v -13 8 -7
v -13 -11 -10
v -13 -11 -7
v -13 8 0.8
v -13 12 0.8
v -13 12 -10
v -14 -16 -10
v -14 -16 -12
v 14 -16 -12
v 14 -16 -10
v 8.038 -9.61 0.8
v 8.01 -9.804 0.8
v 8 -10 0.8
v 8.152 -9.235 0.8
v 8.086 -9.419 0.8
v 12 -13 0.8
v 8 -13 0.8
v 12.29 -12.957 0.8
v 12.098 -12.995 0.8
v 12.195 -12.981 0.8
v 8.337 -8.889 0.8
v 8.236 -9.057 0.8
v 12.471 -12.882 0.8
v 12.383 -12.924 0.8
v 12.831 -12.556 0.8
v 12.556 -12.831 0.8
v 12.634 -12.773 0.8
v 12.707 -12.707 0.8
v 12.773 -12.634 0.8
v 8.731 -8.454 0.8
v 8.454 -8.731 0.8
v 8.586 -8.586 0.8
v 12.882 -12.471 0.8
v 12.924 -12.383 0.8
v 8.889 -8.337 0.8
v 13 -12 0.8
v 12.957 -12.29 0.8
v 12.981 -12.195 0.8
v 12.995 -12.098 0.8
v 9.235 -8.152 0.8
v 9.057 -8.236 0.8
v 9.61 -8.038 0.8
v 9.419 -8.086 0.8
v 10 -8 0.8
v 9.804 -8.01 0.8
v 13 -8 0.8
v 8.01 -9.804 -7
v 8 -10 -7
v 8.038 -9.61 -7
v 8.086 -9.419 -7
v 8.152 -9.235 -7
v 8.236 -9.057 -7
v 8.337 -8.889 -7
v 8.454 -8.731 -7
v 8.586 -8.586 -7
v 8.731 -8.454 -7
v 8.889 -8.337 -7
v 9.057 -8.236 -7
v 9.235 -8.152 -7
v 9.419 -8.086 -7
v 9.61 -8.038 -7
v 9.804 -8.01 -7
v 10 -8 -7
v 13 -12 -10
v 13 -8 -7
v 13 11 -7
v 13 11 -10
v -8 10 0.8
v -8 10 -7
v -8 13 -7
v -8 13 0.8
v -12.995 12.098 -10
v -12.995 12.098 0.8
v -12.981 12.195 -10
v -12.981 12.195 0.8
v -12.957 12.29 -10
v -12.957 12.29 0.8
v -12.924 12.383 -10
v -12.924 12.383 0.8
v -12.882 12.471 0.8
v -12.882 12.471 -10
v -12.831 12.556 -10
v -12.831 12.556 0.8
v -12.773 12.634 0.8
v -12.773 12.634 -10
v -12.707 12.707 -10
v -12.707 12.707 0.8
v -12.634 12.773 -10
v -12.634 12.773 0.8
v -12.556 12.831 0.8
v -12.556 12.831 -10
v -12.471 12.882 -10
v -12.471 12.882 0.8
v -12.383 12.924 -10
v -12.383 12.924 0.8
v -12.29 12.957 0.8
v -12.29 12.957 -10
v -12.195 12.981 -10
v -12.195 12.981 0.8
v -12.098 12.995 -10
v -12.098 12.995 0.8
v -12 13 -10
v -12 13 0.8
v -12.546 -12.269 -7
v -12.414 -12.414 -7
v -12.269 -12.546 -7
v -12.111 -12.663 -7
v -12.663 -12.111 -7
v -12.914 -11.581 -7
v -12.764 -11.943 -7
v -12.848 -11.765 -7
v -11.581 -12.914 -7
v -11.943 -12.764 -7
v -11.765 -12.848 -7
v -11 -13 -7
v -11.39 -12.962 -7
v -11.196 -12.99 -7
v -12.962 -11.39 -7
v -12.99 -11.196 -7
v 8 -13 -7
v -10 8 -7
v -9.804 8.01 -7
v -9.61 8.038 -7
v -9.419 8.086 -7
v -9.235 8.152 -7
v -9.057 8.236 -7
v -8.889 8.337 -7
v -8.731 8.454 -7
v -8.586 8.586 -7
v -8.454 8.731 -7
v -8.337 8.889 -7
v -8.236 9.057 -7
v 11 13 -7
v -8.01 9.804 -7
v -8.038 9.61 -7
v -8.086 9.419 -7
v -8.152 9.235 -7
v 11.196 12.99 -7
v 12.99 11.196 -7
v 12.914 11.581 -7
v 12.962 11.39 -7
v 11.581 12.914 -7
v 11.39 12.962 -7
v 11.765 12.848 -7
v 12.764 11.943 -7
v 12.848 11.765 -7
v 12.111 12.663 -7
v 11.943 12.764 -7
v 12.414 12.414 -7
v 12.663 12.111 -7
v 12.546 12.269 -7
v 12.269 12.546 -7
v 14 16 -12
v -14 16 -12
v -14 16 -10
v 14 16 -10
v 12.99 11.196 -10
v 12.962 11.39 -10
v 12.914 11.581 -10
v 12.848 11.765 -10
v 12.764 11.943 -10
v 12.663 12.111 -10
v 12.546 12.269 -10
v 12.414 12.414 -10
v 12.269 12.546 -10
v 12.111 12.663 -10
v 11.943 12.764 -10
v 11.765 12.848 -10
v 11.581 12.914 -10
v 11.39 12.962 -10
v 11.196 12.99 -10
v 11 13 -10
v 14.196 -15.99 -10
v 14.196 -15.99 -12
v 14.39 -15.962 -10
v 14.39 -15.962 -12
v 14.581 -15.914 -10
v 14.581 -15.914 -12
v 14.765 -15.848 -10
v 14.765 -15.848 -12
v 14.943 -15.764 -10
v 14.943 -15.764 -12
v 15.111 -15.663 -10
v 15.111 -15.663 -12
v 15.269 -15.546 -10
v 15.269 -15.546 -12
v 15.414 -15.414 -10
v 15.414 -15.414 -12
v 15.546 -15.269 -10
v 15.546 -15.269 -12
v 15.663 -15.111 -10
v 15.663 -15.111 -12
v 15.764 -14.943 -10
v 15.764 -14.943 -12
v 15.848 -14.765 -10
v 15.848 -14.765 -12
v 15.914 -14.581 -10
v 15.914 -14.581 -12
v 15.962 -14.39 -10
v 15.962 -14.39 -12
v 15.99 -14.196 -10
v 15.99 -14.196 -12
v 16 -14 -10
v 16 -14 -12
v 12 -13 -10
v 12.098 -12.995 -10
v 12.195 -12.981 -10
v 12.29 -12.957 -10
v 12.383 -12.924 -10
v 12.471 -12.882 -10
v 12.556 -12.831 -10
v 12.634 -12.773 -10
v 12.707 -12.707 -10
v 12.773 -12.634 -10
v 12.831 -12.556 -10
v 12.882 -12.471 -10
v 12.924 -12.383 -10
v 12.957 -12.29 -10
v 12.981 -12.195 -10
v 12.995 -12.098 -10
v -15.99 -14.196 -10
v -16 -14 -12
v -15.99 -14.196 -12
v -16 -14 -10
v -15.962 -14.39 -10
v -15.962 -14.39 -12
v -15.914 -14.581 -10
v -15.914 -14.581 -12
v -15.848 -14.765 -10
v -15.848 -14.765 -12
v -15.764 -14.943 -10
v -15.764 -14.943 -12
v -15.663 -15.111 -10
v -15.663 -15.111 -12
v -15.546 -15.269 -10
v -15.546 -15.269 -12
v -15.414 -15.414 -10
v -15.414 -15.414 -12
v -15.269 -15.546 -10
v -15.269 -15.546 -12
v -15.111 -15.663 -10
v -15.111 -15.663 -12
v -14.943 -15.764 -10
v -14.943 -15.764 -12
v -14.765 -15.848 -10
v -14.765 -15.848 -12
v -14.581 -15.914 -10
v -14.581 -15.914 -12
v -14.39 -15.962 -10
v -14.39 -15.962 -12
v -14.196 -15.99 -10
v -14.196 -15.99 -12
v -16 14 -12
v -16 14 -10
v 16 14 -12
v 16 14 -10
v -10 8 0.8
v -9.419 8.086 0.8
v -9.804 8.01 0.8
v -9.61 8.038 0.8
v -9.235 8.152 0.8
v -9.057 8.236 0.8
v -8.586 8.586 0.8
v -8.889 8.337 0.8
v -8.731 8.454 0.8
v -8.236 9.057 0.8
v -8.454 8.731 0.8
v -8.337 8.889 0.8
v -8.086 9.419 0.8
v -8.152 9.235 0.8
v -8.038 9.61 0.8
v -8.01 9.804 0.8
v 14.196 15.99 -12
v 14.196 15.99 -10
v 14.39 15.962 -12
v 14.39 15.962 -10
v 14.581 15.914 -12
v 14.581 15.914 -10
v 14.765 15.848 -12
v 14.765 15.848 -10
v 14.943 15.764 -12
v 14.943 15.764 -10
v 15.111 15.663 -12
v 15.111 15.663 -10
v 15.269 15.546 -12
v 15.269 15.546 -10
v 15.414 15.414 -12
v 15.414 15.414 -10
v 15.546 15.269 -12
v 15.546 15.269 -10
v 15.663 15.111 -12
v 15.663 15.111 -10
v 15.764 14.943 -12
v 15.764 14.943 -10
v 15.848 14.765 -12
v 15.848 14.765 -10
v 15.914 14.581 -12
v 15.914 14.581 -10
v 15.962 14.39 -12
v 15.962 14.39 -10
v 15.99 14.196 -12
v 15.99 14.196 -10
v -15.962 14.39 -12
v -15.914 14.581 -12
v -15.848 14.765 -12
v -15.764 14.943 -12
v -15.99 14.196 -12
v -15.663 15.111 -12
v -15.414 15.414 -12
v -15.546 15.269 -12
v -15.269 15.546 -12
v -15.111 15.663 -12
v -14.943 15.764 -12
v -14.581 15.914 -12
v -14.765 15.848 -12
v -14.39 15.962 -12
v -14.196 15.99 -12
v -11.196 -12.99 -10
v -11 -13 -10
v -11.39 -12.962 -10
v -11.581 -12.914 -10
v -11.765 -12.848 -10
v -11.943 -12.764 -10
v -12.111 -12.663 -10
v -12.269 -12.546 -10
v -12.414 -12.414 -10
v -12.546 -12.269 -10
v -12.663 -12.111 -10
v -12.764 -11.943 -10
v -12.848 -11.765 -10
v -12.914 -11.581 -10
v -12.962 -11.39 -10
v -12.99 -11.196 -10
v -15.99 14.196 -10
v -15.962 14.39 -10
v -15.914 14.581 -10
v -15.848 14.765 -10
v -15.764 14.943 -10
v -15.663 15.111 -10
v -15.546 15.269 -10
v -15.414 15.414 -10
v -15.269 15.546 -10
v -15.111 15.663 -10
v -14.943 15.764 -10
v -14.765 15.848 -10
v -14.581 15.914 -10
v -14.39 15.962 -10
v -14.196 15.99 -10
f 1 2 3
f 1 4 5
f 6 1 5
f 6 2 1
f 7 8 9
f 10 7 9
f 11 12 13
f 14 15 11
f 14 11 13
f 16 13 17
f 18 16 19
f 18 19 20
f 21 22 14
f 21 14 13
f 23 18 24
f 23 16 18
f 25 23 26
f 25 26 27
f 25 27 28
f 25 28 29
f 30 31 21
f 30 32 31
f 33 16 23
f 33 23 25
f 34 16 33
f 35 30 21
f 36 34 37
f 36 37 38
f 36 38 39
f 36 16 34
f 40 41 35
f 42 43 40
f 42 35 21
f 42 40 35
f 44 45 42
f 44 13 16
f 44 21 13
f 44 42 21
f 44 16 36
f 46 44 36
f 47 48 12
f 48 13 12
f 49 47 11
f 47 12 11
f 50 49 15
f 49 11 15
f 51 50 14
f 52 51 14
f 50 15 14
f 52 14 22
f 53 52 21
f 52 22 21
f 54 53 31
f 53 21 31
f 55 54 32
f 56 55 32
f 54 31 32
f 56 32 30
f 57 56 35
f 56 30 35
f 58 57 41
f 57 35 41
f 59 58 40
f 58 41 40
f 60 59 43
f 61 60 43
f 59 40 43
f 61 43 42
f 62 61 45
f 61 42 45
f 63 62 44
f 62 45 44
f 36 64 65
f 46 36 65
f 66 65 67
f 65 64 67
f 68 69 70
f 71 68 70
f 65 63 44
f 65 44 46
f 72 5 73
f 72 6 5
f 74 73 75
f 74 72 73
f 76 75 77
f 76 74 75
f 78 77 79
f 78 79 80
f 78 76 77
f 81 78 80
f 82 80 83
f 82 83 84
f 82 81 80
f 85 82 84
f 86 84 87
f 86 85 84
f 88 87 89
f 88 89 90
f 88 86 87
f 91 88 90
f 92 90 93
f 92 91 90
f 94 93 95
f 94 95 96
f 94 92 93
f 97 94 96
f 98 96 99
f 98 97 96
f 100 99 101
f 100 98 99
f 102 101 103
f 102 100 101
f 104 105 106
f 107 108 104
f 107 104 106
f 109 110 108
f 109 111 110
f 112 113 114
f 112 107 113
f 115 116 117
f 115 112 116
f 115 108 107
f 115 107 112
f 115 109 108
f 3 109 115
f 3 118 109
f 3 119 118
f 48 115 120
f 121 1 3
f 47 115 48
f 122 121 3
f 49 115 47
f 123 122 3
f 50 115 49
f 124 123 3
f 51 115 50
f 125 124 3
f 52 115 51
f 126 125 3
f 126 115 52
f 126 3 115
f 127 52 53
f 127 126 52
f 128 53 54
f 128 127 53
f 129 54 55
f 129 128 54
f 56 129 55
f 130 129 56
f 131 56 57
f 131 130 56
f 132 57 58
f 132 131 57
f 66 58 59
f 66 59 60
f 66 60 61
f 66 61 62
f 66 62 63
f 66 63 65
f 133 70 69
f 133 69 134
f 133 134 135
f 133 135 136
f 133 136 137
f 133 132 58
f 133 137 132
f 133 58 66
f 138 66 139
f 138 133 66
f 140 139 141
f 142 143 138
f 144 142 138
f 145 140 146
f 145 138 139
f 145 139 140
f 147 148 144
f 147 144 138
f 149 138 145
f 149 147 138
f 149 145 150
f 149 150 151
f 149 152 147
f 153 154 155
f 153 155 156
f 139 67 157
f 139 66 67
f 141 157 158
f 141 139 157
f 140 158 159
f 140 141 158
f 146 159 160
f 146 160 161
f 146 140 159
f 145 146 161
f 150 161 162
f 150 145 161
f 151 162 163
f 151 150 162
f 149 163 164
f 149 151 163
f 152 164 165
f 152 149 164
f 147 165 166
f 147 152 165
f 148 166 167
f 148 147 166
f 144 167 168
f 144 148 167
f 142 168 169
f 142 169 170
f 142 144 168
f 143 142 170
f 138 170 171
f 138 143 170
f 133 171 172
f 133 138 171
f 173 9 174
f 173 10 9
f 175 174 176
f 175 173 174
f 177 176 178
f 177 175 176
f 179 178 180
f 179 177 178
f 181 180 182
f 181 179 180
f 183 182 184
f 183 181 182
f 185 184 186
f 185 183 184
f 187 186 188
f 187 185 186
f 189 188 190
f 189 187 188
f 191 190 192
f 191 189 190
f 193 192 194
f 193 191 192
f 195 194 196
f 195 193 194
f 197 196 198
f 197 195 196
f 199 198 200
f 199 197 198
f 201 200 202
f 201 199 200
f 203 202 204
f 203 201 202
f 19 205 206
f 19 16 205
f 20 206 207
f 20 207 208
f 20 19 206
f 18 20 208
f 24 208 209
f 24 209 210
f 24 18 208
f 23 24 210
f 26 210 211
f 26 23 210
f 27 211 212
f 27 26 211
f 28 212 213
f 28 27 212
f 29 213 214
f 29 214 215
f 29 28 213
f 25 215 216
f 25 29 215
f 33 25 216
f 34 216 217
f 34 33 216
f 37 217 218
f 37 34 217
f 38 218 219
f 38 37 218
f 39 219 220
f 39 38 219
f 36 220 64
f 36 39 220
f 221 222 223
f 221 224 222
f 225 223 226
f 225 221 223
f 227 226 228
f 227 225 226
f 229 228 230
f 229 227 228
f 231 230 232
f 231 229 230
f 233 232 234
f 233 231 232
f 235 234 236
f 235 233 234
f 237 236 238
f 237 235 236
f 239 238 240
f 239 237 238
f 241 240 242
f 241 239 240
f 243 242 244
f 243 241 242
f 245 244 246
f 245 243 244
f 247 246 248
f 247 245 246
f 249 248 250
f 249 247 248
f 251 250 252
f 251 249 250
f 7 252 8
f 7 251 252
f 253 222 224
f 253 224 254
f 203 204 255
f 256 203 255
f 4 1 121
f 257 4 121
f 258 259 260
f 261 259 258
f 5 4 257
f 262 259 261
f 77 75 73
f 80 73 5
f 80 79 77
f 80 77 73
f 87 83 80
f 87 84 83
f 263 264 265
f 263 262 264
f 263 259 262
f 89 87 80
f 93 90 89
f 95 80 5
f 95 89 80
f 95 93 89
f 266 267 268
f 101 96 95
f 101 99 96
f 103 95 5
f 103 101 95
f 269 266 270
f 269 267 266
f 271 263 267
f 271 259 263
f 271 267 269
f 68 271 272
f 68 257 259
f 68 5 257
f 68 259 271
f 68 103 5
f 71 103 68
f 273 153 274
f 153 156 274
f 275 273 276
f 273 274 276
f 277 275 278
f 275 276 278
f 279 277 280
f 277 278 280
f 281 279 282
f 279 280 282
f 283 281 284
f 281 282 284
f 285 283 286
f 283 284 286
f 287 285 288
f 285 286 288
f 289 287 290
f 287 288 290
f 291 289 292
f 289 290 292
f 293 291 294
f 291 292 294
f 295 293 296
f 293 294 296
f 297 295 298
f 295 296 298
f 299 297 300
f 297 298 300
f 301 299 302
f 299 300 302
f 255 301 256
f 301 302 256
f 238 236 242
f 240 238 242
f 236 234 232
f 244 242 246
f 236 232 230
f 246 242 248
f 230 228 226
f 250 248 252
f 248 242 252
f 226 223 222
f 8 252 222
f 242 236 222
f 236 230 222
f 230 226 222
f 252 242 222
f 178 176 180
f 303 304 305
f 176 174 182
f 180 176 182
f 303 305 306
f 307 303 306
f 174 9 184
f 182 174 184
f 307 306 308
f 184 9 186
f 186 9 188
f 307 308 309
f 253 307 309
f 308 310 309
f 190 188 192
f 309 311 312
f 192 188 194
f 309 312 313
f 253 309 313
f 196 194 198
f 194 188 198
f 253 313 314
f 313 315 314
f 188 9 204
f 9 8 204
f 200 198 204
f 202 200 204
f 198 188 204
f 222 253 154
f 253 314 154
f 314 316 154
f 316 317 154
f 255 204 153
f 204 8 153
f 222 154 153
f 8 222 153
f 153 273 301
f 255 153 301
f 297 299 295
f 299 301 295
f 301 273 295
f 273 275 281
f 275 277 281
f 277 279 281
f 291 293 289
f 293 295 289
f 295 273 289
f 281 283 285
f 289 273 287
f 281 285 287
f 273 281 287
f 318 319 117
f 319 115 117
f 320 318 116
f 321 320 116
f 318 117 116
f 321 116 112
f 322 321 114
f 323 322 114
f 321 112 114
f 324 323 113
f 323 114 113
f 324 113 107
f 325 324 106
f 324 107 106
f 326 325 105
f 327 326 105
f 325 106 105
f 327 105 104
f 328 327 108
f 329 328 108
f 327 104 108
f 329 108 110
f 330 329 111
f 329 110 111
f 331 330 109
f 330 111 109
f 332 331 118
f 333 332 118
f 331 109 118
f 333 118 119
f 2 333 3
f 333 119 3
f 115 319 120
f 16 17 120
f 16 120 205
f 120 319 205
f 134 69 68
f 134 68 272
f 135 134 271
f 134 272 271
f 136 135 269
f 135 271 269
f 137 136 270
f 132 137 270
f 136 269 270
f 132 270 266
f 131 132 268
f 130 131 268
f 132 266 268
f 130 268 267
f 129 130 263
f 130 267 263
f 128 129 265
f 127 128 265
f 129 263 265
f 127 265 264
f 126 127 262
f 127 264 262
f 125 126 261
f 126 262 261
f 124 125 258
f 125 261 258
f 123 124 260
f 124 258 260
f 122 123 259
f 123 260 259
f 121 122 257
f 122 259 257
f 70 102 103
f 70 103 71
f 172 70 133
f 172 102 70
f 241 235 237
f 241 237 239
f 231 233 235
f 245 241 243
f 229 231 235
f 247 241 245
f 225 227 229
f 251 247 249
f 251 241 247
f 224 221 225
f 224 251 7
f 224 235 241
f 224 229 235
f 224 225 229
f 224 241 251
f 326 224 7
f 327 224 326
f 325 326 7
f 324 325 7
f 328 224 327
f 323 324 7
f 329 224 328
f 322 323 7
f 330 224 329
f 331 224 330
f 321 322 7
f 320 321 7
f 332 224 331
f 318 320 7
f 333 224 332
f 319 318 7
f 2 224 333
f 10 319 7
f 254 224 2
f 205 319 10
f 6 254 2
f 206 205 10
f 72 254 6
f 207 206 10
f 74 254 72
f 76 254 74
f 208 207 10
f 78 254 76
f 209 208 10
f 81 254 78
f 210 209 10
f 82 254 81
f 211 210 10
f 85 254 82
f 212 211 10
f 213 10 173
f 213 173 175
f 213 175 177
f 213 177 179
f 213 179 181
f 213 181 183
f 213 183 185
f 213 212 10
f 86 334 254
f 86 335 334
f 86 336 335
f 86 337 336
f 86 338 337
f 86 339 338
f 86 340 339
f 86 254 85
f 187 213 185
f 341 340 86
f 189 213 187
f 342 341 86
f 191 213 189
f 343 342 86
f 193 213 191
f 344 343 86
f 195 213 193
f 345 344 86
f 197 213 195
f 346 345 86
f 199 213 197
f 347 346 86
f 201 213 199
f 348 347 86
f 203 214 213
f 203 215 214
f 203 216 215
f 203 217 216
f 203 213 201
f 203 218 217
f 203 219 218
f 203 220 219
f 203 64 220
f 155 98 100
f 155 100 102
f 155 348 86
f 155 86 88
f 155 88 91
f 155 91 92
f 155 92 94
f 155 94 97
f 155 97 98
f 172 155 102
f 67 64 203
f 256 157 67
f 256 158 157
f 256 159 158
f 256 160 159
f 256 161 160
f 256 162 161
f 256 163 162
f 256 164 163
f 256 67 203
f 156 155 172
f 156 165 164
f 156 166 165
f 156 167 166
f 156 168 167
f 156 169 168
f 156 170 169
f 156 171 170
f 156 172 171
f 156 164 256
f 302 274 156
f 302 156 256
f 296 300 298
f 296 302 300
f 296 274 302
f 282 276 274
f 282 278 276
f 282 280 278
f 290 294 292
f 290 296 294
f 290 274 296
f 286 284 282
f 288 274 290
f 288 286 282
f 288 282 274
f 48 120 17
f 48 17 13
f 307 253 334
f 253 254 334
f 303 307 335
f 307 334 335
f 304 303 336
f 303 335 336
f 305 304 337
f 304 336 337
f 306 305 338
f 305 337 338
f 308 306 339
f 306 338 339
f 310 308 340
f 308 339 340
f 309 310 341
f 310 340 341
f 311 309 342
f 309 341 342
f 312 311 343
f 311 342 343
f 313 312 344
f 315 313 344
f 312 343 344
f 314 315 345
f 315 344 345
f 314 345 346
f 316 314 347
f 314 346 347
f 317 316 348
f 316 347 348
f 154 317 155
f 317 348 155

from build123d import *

# Parameters (mm, degrees)
BOX013_W     = 26
BOX013_H     = 26
BOX013_DEPTH = 3
BOX014_W     = 5
BOX014_H     = 5
BOX014_DEPTH = 7.8
BOX015_W     = 5
BOX015_H     = 5
BOX015_DEPTH = 7.8
BOX012_W     = 32
BOX012_H     = 32
BOX012_DEPTH = 2
FILLET_R     = 2
FILLET001_R  = 1
FILLET002_R  = 2


with BuildPart() as kapakic:
    # Box013 → Box013 (new body)
    with BuildSketch(Plane(origin=(-13, -13, -10), x_dir=(1, 0, 0), z_dir=(0, 0, 1))):
        with Locations((13, 13)):
            Rectangle(BOX013_W, BOX013_H)
    extrude(amount=BOX013_DEPTH)


with BuildPart() as kapakcikinti1:
    # Box014 → Box014 (new body)
    with BuildSketch(Plane(origin=(-13, 8, -7), x_dir=(1, 0, 0), z_dir=(0, 0, 1))):
        with Locations((2.5, 2.5)):
            Rectangle(BOX014_W, BOX014_H)
    extrude(amount=BOX014_DEPTH)


with BuildPart() as kapakcikinti2:
    # Box015 → Box015 (new body)
    with BuildSketch(Plane(origin=(8, -13, -7), x_dir=(1, 0, 0), z_dir=(0, 0, 1))):
        with Locations((2.5, 2.5)):
            Rectangle(BOX015_W, BOX015_H)
    extrude(amount=BOX015_DEPTH)


with BuildPart() as fillet002:
    # Box012 → Box012 (new body)
    with BuildSketch(Plane(origin=(-16, -16, -12), x_dir=(1, 0, 0), z_dir=(0, 0, 1))):
        with Locations((16, 16)):
            Rectangle(BOX012_W, BOX012_H)
    extrude(amount=BOX012_DEPTH)

    # Fusion001: union KapakIc, KapakCikinti1, KapakCikinti2
    add(kapakic.part)
    add(kapakcikinti1.part)
    add(kapakcikinti2.part)

    # Fillet
    fillet_edges = [fillet002.edges().sort_by_distance(p)[0] for p in [
        (-8, 8, -3.1),
        (8, -8, -3.1),
    ]]
    fillet(fillet_edges, radius=FILLET_R)

    # Fillet001
    fillet001_edges = [fillet002.edges().sort_by_distance(p)[0] for p in [
        (-13, 13, -3.1),
        (13, -13, -3.1),
    ]]
    fillet(fillet001_edges, radius=FILLET001_R)

    # Fillet002
    fillet002_edges = [fillet002.edges().sort_by_distance(p)[0] for p in [
        (-13, -13, -8.5),
        (13, 13, -8.5),
        (-16, -16, -11),
        (-16, 16, -11),
        (16, 16, -11),
        (16, -16, -11),
    ]]
    fillet(fillet002_edges, radius=FILLET002_R)


solid = fillet002.part
